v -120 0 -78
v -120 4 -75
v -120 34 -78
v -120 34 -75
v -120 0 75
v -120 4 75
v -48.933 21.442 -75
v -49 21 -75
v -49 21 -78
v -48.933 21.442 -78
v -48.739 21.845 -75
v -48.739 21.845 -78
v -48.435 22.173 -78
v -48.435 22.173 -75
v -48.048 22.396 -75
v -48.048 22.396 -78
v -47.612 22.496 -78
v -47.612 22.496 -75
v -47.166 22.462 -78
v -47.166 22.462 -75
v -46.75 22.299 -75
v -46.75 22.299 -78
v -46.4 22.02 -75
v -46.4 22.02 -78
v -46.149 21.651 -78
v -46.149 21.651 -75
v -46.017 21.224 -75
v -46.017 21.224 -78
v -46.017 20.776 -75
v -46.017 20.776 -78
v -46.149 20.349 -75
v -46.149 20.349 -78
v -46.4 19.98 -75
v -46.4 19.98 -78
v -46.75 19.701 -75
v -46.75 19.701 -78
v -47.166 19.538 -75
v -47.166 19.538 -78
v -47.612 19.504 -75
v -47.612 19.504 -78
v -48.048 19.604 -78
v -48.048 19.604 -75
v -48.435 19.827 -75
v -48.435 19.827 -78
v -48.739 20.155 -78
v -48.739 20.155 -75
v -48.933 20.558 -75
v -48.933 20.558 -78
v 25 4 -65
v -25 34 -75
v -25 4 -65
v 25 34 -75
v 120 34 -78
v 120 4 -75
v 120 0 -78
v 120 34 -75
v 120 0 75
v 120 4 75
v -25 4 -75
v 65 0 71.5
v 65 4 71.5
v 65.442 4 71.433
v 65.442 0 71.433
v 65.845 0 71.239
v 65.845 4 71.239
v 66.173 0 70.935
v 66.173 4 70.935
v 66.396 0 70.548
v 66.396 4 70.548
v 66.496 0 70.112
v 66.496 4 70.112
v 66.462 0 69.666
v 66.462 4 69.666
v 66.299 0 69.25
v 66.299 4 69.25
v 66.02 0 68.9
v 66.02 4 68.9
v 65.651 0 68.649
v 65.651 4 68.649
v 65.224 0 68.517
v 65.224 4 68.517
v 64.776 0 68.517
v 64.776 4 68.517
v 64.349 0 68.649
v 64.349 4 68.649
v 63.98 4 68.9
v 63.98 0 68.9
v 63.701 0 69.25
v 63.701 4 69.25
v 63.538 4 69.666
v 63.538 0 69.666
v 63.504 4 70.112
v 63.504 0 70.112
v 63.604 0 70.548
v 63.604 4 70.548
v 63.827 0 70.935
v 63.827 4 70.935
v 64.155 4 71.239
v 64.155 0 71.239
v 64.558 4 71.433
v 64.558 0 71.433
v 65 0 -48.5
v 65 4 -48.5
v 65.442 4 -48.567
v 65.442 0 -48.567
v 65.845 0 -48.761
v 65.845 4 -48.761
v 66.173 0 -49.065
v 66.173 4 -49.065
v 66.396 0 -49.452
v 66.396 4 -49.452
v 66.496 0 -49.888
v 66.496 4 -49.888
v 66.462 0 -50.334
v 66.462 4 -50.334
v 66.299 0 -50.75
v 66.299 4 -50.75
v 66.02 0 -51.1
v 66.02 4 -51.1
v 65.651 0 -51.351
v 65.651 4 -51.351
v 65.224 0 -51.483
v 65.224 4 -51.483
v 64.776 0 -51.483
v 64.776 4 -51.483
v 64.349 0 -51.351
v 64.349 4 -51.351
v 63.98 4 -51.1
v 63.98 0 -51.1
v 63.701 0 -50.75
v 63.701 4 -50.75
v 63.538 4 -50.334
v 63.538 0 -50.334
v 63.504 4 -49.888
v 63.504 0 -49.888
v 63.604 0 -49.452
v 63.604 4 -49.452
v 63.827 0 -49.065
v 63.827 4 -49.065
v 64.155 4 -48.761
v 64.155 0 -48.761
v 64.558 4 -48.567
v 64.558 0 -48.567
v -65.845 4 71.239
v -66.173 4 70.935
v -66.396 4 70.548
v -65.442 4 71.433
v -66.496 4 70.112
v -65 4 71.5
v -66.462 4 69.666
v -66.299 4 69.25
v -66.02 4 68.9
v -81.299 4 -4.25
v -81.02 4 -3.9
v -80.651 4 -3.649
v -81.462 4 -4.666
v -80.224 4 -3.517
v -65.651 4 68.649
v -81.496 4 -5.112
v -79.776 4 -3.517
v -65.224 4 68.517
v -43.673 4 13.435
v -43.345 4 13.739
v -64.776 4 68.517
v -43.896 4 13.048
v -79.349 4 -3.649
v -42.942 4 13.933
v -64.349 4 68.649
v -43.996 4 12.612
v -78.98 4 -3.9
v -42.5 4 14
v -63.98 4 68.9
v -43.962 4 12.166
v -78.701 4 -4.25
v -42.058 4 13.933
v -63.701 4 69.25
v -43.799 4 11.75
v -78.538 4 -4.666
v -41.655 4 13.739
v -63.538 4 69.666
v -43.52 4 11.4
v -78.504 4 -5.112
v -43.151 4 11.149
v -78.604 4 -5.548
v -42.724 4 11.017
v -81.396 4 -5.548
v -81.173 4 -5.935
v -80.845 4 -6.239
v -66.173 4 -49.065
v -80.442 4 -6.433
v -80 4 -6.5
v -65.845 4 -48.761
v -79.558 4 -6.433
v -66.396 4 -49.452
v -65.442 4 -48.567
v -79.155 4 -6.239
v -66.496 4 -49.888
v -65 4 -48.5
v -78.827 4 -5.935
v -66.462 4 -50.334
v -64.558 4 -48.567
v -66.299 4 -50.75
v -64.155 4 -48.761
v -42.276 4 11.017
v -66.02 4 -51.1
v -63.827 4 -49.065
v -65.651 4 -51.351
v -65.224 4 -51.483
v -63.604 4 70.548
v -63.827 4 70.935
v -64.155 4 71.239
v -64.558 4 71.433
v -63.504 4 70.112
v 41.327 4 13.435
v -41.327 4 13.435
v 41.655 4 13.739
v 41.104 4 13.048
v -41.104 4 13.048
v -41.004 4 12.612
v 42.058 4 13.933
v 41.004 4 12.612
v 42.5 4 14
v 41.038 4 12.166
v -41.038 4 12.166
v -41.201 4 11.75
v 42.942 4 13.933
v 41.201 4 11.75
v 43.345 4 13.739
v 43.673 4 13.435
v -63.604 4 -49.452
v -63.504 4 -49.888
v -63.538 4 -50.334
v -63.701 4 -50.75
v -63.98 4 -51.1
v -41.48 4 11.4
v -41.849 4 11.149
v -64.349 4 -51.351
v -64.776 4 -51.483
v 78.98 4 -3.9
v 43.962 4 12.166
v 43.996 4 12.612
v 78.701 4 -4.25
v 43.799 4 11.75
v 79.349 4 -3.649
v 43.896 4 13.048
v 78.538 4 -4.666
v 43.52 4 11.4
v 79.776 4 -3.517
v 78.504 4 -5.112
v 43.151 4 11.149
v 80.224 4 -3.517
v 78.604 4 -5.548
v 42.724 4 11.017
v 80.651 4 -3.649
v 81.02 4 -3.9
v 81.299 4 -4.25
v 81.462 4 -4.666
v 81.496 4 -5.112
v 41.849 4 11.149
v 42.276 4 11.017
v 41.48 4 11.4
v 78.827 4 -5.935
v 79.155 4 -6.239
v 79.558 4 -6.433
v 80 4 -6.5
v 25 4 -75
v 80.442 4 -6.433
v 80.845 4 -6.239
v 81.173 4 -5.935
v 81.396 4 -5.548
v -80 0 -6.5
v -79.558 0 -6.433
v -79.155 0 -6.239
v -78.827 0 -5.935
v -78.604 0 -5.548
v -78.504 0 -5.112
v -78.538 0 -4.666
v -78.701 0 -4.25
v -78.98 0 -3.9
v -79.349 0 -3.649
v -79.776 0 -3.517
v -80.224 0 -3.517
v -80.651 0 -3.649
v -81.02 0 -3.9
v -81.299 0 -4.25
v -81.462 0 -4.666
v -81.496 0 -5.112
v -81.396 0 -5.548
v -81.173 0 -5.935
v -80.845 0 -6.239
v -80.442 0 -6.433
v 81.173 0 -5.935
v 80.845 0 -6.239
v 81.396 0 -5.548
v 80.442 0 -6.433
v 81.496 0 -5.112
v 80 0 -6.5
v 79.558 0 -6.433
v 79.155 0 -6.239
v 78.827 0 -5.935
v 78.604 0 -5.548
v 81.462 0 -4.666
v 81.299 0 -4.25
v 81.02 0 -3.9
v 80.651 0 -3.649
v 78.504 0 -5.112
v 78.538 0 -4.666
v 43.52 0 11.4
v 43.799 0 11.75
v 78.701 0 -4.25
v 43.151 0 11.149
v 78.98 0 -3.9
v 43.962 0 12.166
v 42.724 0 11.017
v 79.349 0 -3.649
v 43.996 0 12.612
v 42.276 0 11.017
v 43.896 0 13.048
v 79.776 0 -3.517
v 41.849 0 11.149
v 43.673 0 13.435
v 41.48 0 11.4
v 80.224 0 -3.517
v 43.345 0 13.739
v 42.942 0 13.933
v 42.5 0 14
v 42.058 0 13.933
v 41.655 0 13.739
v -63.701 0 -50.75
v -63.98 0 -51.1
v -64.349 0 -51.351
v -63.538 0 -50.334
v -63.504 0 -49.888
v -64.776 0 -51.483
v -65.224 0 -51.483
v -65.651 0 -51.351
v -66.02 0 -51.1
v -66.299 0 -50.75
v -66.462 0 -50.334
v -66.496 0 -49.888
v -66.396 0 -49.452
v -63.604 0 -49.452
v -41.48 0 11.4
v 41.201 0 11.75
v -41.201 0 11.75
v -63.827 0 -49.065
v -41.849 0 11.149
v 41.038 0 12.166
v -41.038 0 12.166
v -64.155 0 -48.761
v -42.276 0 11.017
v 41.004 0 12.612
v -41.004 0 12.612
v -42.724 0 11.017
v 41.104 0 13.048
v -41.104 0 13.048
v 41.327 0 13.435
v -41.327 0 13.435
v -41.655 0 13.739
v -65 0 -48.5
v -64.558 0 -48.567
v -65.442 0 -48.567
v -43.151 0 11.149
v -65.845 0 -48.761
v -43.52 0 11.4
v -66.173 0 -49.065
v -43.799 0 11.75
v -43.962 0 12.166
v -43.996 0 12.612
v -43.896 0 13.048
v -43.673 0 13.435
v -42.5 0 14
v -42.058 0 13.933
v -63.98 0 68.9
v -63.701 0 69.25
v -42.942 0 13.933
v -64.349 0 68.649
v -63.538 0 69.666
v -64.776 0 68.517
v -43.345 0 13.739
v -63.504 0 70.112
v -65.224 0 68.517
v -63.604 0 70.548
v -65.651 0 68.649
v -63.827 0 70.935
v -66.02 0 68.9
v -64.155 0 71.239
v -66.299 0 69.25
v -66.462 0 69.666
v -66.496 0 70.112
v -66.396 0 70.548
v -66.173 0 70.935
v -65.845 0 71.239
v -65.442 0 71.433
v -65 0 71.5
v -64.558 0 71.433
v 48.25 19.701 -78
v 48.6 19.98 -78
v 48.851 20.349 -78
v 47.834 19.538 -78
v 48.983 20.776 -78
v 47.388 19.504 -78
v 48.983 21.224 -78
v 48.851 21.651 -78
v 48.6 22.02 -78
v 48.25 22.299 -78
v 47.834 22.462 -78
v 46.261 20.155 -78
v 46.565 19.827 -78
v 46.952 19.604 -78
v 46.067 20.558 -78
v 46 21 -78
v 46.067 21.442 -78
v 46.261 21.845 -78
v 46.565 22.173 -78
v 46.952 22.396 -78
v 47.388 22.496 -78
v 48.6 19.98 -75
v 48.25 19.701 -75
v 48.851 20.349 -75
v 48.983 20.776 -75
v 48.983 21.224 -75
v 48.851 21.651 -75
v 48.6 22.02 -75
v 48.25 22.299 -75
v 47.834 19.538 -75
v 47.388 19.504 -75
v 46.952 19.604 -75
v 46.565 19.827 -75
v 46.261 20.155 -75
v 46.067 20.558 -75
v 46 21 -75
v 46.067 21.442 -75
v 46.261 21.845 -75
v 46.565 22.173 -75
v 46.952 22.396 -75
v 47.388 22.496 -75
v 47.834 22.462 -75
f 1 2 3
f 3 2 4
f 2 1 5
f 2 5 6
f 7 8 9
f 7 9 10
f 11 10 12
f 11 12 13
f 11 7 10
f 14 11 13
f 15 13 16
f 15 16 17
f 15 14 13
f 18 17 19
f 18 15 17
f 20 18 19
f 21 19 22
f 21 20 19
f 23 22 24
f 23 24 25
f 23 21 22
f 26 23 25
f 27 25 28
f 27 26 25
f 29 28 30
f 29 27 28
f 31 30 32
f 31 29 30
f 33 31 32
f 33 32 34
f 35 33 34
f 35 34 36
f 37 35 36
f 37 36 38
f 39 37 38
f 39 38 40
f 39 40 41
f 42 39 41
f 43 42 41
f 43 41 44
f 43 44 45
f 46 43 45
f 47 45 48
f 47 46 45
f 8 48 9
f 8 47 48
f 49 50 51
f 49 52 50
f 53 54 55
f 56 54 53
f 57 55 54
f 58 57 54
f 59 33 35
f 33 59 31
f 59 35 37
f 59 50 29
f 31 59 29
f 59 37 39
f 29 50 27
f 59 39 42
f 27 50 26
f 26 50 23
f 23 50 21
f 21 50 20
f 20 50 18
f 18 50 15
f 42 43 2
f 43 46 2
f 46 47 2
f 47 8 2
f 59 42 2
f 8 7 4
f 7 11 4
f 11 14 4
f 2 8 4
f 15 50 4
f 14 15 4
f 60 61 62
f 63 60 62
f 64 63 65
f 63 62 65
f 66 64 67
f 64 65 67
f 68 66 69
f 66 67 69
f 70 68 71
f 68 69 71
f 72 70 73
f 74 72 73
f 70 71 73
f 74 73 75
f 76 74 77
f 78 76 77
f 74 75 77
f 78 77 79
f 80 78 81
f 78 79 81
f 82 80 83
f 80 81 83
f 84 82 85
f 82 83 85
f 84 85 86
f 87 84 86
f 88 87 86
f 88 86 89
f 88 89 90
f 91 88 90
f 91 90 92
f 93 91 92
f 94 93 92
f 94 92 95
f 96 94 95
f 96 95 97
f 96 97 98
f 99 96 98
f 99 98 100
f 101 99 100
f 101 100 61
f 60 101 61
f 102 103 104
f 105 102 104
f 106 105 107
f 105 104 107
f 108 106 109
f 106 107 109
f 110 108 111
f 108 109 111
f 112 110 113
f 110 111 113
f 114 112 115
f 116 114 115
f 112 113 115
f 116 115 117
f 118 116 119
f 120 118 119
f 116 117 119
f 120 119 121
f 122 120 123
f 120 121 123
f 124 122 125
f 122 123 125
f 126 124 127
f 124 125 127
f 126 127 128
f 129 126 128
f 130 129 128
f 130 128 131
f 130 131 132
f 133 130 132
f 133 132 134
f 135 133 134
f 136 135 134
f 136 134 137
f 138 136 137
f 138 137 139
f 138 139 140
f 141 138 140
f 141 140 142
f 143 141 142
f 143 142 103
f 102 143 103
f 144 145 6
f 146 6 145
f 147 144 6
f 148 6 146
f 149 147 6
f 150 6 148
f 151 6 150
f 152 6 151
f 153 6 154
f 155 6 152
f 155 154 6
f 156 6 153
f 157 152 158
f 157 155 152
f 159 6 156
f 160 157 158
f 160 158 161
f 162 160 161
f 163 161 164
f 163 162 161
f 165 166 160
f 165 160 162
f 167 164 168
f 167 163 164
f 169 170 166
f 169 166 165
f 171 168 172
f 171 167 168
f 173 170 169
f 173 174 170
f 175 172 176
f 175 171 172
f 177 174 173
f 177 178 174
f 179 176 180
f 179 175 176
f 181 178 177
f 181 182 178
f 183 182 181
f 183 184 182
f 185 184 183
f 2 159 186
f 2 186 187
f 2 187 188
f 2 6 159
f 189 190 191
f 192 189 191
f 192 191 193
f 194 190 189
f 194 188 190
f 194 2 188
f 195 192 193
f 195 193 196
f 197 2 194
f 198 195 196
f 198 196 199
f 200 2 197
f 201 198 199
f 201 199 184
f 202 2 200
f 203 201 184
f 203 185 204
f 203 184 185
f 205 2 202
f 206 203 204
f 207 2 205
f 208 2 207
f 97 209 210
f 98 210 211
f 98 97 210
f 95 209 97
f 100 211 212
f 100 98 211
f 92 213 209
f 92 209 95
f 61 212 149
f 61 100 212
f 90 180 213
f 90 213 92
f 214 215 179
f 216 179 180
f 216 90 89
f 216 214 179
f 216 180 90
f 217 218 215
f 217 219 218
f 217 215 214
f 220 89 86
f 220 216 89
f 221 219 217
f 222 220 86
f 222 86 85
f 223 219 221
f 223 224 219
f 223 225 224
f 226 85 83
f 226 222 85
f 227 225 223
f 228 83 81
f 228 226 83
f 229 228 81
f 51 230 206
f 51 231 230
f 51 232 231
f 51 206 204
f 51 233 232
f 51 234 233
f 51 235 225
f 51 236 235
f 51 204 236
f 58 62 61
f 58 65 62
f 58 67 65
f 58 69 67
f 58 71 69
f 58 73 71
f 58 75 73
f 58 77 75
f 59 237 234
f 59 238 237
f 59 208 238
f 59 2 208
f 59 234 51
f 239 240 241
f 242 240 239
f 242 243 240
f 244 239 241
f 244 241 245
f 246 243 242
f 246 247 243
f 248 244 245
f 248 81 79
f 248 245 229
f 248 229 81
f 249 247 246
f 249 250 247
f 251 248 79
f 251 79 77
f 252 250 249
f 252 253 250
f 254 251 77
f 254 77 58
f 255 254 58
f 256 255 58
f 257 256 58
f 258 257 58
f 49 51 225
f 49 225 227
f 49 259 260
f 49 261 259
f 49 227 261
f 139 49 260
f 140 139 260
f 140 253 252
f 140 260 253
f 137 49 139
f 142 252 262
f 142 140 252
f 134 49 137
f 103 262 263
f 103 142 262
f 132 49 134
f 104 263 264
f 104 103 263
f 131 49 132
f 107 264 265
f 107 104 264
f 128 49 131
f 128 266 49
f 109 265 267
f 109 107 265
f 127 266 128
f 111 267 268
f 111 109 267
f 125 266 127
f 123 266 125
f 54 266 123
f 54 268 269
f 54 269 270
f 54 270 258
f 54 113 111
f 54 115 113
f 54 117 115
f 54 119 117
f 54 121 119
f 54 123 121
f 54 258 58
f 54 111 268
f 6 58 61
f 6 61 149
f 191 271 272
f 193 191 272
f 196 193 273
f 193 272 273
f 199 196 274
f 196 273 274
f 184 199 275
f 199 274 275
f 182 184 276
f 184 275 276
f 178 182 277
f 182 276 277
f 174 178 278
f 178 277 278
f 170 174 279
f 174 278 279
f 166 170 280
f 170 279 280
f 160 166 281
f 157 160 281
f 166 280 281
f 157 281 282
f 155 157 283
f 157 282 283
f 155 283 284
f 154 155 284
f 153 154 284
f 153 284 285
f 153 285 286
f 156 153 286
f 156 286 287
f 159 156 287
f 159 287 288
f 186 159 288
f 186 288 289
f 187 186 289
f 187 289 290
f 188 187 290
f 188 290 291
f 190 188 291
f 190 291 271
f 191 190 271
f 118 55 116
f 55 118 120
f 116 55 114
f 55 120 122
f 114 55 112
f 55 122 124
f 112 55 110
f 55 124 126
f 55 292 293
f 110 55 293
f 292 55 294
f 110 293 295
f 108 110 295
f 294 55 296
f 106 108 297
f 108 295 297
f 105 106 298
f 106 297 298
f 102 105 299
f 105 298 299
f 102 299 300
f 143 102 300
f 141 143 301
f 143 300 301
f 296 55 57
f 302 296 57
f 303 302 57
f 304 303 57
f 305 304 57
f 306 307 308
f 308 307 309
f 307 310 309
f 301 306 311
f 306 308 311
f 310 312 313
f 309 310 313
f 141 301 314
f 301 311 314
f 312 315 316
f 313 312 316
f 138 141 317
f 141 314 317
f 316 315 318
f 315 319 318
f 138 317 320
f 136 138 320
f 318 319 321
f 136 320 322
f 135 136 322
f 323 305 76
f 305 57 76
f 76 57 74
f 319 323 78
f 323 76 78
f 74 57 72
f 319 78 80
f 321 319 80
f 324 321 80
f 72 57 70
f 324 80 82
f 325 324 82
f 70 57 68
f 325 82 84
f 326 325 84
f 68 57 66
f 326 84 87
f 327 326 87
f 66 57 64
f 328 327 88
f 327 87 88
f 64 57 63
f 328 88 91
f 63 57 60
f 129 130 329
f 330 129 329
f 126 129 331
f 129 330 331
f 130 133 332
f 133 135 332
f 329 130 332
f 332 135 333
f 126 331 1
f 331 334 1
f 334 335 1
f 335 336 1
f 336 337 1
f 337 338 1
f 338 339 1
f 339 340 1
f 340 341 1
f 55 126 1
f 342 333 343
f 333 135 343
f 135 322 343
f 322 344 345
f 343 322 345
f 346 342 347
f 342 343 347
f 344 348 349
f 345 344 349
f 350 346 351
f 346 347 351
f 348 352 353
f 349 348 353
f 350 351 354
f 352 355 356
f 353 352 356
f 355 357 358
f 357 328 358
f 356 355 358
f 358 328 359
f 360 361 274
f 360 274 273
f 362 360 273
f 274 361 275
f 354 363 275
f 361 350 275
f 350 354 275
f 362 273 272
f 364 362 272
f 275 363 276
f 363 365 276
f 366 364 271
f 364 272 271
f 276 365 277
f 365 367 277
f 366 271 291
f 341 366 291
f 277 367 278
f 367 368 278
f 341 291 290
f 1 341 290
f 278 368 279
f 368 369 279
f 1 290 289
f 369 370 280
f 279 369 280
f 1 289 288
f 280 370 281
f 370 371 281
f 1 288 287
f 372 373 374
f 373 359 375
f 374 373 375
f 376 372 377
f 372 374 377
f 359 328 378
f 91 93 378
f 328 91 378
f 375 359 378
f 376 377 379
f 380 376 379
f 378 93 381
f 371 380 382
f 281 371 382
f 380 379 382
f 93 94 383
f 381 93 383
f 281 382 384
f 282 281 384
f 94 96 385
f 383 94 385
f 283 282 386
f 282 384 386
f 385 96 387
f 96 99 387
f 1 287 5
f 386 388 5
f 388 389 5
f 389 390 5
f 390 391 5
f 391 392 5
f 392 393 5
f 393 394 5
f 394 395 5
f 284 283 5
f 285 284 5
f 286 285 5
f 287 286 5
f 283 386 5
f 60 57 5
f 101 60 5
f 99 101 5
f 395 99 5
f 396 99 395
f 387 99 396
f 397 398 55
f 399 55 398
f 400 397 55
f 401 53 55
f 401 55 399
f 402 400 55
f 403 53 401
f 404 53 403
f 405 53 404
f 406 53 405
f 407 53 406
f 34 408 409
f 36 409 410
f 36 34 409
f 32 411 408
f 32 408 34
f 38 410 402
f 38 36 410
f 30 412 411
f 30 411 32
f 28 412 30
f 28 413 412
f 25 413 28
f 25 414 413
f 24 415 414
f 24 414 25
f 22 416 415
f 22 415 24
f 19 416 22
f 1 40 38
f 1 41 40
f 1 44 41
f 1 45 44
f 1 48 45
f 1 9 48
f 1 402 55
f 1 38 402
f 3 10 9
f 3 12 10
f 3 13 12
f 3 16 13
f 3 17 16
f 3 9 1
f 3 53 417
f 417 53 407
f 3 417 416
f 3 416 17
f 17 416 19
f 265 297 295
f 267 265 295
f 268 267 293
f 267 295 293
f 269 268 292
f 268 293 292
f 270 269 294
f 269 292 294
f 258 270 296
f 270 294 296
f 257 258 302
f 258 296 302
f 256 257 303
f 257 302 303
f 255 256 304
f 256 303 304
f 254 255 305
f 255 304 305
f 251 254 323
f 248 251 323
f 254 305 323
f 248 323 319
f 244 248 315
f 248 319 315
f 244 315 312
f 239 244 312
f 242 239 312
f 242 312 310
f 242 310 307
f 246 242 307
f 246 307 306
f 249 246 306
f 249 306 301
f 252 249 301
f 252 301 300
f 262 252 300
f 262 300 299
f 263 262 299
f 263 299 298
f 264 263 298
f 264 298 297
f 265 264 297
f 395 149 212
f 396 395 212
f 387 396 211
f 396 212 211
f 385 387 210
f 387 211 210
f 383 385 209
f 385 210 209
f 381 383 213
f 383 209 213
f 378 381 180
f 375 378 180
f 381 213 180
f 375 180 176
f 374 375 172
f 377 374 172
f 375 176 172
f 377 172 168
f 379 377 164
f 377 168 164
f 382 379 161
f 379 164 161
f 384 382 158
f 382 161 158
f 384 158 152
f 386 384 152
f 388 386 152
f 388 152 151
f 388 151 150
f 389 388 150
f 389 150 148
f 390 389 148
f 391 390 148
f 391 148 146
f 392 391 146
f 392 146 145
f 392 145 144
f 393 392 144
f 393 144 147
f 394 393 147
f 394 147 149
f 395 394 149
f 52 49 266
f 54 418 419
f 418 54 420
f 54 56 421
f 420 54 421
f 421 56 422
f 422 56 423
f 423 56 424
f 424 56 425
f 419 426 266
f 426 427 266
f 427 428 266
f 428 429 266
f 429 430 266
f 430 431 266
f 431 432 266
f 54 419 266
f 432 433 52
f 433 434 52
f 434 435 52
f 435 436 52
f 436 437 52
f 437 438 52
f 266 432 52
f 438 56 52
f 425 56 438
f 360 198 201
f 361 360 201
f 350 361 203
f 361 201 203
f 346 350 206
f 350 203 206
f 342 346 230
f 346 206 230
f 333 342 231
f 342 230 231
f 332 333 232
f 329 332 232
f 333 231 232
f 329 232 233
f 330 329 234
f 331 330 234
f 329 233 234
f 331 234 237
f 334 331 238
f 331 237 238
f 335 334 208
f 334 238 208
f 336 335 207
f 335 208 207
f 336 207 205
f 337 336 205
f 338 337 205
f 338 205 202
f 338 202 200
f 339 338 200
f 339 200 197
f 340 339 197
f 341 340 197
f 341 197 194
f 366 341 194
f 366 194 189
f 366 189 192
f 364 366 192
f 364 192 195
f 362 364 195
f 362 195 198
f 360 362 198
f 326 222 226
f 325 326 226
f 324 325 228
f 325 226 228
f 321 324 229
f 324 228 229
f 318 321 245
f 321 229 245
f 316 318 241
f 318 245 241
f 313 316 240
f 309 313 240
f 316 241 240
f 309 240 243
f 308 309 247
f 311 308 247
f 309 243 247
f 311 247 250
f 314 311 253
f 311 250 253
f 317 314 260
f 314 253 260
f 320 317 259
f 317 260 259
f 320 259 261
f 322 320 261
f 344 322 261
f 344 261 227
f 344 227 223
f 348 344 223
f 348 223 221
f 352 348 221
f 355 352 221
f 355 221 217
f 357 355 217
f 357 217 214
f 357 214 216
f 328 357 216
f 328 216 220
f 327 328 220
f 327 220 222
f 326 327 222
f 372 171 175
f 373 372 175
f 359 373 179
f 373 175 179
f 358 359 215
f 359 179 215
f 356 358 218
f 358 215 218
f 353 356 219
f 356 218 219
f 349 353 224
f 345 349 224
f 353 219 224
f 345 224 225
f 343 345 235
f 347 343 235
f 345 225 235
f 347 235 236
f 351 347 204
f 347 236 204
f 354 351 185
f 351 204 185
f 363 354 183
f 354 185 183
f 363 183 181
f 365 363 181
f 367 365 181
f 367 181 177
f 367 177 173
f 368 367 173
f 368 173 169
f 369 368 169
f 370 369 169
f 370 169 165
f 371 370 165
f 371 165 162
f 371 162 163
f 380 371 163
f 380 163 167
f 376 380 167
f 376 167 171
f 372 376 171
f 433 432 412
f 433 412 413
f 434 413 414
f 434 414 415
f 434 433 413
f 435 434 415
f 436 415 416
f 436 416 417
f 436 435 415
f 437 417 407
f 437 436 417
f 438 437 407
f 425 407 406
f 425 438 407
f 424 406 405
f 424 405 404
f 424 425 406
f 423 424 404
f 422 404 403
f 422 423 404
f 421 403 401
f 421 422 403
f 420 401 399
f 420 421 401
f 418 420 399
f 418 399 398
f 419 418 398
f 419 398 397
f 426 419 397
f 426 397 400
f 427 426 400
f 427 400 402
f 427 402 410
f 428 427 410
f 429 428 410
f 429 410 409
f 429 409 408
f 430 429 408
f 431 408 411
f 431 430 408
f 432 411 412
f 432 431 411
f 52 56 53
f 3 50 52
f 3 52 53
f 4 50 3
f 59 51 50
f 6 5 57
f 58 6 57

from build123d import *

# Parameters (mm, degrees)
SKETCH1_W           = 240
SKETCH1_H           = 150
BOSS_EXTRUDE1_DEPTH = 4
SKETCH3_R           = 1.5
CUT_EXTRUDE1_DEPTH  = 50
SKETCH5_W           = 240
SKETCH5_H           = 34
SKETCH5_R           = 1.5
BOSS_EXTRUDE4_DEPTH = 3
BOSS_EXTRUDE5_DEPTH = 25
SKETCH4_R           = 1.5
CUT_EXTRUDE2_DEPTH  = 147.232691283
SKETCH2_R           = 1.5
CUT_EXTRUDE3_DEPTH  = 10


with BuildPart() as part:
    # Sketch1 → Boss-Extrude1 (new body)
    with BuildSketch(Plane(origin=(0, 0, 0), x_dir=(1, 0, 0), z_dir=(0, 1, 0))):
        Rectangle(SKETCH1_W, SKETCH1_H)
    extrude(amount=BOSS_EXTRUDE1_DEPTH)

    # Sketch3 → Cut-Extrude1 (cut)
    with BuildSketch(Plane(origin=(0, 4, 0), x_dir=(1, 0, 0), z_dir=(0, 1, 0))):
        with Locations(Location((-65, 50, 0), (0, 0, 270))):
            Circle(SKETCH3_R)
        with Locations(Location((65, 50, 0), (0, 0, 270))):
            Circle(SKETCH3_R)
        with Locations(Location((65, -70, 0), (0, 0, 270))):
            Circle(SKETCH3_R)
        with Locations(Location((-65, -70, 0), (0, 0, 270))):
            Circle(SKETCH3_R)
    extrude(amount=-CUT_EXTRUDE1_DEPTH, mode=Mode.SUBTRACT)

    # Sketch5 → Boss-Extrude4 (add)
    with BuildSketch(Plane(origin=(0, 0, -75), x_dir=(-1, 0, 0), z_dir=(0, 0, -1))):
        with Locations((0, 17)):
            Rectangle(SKETCH5_W, SKETCH5_H)
        with Locations((47.5, 21)):
            Circle(SKETCH5_R, mode=Mode.SUBTRACT)
        with Locations((-47.5, 21)):
            Circle(SKETCH5_R, mode=Mode.SUBTRACT)
    extrude(amount=BOSS_EXTRUDE4_DEPTH)

    # Sketch8 → Boss-Extrude5 (add, symmetric)
    with BuildSketch(Plane(origin=(0, 0, 0), x_dir=(0, 0, -1), z_dir=(1, 0, 0))):
        Polygon((75, 34), (65, 4), (75, 4), align=None)
    extrude(amount=BOSS_EXTRUDE5_DEPTH, both=True)

    # Sketch4 → Cut-Extrude2 (cut, through all)
    with BuildSketch(Plane(origin=(0, 4, 0), x_dir=(1, 0, 0), z_dir=(0, 1, 0))):
        with Locations(Location((42.5, -12.5, 0), (0, 0, 270))):
            Circle(SKETCH4_R)
        with Locations(Location((-42.5, -12.5, 0), (0, 0, 270))):
            Circle(SKETCH4_R)
    extrude(amount=-CUT_EXTRUDE2_DEPTH, mode=Mode.SUBTRACT)

    # Sketch2 → Cut-Extrude3 (cut)
    with BuildSketch(Plane.XZ):
        with Locations(Location((80, -5, 0), (0, 0, 270))):
            Circle(SKETCH2_R)
        with Locations(Location((-80, -5, 0), (0, 0, 270))):
            Circle(SKETCH2_R)
    extrude(amount=-CUT_EXTRUDE3_DEPTH, mode=Mode.SUBTRACT)


solid = part.part
